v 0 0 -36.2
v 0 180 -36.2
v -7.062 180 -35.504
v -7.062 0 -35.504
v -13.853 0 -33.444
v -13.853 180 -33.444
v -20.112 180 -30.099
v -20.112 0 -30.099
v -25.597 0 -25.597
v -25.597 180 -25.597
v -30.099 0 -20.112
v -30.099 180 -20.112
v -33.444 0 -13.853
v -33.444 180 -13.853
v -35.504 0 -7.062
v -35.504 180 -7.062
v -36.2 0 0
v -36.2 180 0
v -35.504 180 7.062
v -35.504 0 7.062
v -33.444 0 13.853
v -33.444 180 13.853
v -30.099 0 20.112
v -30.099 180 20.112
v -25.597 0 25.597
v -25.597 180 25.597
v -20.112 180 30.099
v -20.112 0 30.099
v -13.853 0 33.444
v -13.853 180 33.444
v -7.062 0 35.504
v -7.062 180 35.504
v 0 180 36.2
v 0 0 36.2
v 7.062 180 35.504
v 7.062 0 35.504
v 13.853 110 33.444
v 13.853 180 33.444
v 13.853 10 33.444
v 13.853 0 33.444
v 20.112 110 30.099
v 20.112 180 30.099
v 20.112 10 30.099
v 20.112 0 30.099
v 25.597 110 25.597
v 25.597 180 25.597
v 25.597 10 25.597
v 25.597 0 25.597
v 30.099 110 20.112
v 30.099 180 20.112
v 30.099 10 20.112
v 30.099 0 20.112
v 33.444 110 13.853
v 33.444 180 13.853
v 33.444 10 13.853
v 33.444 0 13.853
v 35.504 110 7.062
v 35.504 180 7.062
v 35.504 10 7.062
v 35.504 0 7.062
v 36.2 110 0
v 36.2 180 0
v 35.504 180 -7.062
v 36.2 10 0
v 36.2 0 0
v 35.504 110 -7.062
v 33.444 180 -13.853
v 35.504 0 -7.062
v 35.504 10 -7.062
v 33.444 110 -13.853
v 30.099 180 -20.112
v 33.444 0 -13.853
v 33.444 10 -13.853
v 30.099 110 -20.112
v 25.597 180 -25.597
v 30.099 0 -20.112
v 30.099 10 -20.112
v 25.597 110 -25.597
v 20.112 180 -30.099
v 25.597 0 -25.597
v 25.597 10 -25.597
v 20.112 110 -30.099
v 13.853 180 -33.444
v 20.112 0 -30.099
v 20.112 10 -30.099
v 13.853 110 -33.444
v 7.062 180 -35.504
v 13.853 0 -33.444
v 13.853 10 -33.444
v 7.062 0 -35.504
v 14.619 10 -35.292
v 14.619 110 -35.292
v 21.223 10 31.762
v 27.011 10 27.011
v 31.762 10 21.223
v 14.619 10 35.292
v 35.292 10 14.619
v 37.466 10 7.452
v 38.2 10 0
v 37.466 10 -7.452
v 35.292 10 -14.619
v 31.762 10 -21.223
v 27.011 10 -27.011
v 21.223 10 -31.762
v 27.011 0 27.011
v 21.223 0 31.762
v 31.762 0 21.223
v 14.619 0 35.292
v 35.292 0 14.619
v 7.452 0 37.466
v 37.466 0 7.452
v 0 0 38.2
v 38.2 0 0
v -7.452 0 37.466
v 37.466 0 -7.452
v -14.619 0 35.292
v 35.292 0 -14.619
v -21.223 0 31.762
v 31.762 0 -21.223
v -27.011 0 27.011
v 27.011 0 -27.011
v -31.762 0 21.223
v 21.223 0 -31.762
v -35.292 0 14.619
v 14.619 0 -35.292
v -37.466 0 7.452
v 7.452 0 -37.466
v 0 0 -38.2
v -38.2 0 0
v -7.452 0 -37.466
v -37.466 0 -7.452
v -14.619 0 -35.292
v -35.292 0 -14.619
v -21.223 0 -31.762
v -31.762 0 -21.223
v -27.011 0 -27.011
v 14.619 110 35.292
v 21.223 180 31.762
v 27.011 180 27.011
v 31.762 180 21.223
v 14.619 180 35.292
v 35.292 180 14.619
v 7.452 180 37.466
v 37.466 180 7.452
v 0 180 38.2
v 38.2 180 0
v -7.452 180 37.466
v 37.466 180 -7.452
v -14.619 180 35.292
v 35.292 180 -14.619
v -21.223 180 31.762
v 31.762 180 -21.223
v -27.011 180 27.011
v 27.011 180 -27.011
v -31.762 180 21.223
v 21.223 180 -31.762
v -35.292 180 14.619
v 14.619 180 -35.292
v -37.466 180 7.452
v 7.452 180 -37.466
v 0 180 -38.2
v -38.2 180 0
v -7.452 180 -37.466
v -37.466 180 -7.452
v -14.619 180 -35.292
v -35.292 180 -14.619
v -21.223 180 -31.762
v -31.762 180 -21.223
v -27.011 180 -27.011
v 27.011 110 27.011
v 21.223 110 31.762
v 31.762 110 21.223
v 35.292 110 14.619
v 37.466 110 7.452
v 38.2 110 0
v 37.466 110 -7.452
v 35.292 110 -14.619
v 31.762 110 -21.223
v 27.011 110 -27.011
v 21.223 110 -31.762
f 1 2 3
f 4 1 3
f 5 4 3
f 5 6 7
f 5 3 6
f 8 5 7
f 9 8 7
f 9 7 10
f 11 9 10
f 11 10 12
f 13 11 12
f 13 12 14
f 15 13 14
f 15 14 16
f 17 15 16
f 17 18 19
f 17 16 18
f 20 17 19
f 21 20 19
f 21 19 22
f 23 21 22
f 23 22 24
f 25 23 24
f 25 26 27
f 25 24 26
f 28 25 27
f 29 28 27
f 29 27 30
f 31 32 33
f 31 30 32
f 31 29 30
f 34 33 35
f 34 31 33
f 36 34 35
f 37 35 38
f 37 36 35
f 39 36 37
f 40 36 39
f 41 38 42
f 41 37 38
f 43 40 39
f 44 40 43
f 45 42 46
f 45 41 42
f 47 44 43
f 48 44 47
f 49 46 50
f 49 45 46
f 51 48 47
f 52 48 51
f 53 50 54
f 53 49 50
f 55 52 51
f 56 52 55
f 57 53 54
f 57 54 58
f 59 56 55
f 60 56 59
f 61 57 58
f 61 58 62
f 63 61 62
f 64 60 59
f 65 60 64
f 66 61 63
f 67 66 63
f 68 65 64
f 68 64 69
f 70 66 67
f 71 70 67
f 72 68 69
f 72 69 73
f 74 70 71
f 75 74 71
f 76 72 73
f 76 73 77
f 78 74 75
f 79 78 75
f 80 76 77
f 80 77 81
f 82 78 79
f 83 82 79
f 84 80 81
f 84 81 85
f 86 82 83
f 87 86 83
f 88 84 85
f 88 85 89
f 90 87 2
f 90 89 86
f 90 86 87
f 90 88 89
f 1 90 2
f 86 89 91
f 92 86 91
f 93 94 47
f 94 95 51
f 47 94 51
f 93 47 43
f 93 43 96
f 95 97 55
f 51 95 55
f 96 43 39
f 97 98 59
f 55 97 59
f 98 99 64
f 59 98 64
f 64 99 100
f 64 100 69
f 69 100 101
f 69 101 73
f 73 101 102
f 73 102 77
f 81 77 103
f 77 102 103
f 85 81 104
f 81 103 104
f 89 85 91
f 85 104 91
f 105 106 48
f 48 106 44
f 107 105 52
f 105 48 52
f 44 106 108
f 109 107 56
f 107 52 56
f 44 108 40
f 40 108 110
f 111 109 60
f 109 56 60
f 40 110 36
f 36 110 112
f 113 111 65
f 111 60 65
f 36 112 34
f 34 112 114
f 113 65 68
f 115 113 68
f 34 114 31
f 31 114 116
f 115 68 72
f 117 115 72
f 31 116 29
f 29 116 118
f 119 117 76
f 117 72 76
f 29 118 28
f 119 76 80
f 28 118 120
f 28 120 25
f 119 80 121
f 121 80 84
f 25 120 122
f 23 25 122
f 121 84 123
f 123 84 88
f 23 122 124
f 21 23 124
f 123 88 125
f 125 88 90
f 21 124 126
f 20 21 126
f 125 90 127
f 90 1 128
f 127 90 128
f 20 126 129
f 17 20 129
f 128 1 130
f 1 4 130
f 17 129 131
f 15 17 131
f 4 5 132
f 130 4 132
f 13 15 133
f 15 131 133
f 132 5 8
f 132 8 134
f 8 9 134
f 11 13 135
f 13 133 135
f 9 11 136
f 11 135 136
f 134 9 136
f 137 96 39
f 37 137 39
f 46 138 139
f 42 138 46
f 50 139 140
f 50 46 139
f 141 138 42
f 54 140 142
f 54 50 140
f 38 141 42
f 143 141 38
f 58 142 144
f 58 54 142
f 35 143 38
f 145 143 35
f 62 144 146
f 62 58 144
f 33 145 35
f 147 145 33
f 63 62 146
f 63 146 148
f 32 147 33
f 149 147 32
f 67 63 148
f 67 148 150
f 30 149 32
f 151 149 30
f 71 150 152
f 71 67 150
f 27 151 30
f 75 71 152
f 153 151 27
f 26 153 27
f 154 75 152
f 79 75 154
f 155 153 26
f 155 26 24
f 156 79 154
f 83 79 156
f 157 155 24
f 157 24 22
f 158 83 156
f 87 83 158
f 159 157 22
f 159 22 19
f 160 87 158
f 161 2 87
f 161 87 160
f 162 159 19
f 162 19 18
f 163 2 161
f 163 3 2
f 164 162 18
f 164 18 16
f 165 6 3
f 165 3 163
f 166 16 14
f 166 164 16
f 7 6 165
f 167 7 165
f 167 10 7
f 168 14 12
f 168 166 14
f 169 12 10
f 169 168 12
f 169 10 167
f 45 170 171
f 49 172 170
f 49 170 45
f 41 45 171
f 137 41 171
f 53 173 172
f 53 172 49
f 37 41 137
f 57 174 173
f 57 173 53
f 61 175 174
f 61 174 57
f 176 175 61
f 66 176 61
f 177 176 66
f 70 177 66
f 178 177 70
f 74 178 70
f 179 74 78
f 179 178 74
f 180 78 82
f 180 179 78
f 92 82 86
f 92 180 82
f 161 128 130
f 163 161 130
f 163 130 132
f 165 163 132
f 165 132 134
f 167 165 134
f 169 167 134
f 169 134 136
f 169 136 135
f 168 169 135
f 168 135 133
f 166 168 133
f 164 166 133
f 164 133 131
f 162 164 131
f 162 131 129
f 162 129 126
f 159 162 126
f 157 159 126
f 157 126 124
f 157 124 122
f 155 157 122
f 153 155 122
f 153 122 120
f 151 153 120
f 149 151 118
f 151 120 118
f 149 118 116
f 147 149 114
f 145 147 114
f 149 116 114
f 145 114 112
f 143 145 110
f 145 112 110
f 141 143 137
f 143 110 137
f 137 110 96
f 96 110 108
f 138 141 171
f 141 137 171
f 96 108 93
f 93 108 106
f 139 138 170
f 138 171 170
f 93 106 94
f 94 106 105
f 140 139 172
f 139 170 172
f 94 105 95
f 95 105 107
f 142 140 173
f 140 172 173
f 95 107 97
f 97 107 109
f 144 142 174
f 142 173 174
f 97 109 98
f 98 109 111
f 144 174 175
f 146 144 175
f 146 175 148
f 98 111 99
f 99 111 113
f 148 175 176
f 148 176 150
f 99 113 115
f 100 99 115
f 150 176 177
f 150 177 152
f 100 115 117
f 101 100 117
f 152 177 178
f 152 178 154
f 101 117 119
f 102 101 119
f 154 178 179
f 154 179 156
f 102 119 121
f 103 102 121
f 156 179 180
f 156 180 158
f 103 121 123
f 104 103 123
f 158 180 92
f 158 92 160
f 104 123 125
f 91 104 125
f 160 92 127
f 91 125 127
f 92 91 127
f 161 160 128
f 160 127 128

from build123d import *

# Parameters (mm, degrees)
SKETCH1_R           = 38.2
BOSS_EXTRUDE1_DEPTH = 180
SHELL1_T            = -2
CUT_EXTRUDE2_DEPTH  = 100


with BuildPart() as part:
    # Sketch1 → Boss-Extrude1 (new body)
    with BuildSketch(Plane(origin=(0, 0, 0), x_dir=(1, 0, 0), z_dir=(0, 1, 0))):
        with Locations(Location((0, 0, 0), (0, 0, 90))):
            Circle(SKETCH1_R)
    extrude(amount=BOSS_EXTRUDE1_DEPTH)

    # Shell1
    shell1_openings = [part.faces().sort_by_distance(p)[0] for p in [
        (0, 180, 0),
        (0, 0, 0),
    ]]
    offset(amount=SHELL1_T, openings=shell1_openings, kind=Kind.INTERSECTION)

    # Sketch4 → Cut-Extrude2 (cut)
    with BuildSketch(Plane(origin=(0, 10, 0), x_dir=(1, 0, 0), z_dir=(0, 1, 0))):
        with BuildLine():
            Line((0, 0), (14.618507116, 35.292198142))
            ThreePointArc((14.618507116, 35.292198142), (38.2, 0), (14.618507116, -35.292198142))
            Line((14.618507116, -35.292198142), (0, 0))
        make_face()
    extrude(amount=CUT_EXTRUDE2_DEPTH, mode=Mode.SUBTRACT)


solid = part.part
